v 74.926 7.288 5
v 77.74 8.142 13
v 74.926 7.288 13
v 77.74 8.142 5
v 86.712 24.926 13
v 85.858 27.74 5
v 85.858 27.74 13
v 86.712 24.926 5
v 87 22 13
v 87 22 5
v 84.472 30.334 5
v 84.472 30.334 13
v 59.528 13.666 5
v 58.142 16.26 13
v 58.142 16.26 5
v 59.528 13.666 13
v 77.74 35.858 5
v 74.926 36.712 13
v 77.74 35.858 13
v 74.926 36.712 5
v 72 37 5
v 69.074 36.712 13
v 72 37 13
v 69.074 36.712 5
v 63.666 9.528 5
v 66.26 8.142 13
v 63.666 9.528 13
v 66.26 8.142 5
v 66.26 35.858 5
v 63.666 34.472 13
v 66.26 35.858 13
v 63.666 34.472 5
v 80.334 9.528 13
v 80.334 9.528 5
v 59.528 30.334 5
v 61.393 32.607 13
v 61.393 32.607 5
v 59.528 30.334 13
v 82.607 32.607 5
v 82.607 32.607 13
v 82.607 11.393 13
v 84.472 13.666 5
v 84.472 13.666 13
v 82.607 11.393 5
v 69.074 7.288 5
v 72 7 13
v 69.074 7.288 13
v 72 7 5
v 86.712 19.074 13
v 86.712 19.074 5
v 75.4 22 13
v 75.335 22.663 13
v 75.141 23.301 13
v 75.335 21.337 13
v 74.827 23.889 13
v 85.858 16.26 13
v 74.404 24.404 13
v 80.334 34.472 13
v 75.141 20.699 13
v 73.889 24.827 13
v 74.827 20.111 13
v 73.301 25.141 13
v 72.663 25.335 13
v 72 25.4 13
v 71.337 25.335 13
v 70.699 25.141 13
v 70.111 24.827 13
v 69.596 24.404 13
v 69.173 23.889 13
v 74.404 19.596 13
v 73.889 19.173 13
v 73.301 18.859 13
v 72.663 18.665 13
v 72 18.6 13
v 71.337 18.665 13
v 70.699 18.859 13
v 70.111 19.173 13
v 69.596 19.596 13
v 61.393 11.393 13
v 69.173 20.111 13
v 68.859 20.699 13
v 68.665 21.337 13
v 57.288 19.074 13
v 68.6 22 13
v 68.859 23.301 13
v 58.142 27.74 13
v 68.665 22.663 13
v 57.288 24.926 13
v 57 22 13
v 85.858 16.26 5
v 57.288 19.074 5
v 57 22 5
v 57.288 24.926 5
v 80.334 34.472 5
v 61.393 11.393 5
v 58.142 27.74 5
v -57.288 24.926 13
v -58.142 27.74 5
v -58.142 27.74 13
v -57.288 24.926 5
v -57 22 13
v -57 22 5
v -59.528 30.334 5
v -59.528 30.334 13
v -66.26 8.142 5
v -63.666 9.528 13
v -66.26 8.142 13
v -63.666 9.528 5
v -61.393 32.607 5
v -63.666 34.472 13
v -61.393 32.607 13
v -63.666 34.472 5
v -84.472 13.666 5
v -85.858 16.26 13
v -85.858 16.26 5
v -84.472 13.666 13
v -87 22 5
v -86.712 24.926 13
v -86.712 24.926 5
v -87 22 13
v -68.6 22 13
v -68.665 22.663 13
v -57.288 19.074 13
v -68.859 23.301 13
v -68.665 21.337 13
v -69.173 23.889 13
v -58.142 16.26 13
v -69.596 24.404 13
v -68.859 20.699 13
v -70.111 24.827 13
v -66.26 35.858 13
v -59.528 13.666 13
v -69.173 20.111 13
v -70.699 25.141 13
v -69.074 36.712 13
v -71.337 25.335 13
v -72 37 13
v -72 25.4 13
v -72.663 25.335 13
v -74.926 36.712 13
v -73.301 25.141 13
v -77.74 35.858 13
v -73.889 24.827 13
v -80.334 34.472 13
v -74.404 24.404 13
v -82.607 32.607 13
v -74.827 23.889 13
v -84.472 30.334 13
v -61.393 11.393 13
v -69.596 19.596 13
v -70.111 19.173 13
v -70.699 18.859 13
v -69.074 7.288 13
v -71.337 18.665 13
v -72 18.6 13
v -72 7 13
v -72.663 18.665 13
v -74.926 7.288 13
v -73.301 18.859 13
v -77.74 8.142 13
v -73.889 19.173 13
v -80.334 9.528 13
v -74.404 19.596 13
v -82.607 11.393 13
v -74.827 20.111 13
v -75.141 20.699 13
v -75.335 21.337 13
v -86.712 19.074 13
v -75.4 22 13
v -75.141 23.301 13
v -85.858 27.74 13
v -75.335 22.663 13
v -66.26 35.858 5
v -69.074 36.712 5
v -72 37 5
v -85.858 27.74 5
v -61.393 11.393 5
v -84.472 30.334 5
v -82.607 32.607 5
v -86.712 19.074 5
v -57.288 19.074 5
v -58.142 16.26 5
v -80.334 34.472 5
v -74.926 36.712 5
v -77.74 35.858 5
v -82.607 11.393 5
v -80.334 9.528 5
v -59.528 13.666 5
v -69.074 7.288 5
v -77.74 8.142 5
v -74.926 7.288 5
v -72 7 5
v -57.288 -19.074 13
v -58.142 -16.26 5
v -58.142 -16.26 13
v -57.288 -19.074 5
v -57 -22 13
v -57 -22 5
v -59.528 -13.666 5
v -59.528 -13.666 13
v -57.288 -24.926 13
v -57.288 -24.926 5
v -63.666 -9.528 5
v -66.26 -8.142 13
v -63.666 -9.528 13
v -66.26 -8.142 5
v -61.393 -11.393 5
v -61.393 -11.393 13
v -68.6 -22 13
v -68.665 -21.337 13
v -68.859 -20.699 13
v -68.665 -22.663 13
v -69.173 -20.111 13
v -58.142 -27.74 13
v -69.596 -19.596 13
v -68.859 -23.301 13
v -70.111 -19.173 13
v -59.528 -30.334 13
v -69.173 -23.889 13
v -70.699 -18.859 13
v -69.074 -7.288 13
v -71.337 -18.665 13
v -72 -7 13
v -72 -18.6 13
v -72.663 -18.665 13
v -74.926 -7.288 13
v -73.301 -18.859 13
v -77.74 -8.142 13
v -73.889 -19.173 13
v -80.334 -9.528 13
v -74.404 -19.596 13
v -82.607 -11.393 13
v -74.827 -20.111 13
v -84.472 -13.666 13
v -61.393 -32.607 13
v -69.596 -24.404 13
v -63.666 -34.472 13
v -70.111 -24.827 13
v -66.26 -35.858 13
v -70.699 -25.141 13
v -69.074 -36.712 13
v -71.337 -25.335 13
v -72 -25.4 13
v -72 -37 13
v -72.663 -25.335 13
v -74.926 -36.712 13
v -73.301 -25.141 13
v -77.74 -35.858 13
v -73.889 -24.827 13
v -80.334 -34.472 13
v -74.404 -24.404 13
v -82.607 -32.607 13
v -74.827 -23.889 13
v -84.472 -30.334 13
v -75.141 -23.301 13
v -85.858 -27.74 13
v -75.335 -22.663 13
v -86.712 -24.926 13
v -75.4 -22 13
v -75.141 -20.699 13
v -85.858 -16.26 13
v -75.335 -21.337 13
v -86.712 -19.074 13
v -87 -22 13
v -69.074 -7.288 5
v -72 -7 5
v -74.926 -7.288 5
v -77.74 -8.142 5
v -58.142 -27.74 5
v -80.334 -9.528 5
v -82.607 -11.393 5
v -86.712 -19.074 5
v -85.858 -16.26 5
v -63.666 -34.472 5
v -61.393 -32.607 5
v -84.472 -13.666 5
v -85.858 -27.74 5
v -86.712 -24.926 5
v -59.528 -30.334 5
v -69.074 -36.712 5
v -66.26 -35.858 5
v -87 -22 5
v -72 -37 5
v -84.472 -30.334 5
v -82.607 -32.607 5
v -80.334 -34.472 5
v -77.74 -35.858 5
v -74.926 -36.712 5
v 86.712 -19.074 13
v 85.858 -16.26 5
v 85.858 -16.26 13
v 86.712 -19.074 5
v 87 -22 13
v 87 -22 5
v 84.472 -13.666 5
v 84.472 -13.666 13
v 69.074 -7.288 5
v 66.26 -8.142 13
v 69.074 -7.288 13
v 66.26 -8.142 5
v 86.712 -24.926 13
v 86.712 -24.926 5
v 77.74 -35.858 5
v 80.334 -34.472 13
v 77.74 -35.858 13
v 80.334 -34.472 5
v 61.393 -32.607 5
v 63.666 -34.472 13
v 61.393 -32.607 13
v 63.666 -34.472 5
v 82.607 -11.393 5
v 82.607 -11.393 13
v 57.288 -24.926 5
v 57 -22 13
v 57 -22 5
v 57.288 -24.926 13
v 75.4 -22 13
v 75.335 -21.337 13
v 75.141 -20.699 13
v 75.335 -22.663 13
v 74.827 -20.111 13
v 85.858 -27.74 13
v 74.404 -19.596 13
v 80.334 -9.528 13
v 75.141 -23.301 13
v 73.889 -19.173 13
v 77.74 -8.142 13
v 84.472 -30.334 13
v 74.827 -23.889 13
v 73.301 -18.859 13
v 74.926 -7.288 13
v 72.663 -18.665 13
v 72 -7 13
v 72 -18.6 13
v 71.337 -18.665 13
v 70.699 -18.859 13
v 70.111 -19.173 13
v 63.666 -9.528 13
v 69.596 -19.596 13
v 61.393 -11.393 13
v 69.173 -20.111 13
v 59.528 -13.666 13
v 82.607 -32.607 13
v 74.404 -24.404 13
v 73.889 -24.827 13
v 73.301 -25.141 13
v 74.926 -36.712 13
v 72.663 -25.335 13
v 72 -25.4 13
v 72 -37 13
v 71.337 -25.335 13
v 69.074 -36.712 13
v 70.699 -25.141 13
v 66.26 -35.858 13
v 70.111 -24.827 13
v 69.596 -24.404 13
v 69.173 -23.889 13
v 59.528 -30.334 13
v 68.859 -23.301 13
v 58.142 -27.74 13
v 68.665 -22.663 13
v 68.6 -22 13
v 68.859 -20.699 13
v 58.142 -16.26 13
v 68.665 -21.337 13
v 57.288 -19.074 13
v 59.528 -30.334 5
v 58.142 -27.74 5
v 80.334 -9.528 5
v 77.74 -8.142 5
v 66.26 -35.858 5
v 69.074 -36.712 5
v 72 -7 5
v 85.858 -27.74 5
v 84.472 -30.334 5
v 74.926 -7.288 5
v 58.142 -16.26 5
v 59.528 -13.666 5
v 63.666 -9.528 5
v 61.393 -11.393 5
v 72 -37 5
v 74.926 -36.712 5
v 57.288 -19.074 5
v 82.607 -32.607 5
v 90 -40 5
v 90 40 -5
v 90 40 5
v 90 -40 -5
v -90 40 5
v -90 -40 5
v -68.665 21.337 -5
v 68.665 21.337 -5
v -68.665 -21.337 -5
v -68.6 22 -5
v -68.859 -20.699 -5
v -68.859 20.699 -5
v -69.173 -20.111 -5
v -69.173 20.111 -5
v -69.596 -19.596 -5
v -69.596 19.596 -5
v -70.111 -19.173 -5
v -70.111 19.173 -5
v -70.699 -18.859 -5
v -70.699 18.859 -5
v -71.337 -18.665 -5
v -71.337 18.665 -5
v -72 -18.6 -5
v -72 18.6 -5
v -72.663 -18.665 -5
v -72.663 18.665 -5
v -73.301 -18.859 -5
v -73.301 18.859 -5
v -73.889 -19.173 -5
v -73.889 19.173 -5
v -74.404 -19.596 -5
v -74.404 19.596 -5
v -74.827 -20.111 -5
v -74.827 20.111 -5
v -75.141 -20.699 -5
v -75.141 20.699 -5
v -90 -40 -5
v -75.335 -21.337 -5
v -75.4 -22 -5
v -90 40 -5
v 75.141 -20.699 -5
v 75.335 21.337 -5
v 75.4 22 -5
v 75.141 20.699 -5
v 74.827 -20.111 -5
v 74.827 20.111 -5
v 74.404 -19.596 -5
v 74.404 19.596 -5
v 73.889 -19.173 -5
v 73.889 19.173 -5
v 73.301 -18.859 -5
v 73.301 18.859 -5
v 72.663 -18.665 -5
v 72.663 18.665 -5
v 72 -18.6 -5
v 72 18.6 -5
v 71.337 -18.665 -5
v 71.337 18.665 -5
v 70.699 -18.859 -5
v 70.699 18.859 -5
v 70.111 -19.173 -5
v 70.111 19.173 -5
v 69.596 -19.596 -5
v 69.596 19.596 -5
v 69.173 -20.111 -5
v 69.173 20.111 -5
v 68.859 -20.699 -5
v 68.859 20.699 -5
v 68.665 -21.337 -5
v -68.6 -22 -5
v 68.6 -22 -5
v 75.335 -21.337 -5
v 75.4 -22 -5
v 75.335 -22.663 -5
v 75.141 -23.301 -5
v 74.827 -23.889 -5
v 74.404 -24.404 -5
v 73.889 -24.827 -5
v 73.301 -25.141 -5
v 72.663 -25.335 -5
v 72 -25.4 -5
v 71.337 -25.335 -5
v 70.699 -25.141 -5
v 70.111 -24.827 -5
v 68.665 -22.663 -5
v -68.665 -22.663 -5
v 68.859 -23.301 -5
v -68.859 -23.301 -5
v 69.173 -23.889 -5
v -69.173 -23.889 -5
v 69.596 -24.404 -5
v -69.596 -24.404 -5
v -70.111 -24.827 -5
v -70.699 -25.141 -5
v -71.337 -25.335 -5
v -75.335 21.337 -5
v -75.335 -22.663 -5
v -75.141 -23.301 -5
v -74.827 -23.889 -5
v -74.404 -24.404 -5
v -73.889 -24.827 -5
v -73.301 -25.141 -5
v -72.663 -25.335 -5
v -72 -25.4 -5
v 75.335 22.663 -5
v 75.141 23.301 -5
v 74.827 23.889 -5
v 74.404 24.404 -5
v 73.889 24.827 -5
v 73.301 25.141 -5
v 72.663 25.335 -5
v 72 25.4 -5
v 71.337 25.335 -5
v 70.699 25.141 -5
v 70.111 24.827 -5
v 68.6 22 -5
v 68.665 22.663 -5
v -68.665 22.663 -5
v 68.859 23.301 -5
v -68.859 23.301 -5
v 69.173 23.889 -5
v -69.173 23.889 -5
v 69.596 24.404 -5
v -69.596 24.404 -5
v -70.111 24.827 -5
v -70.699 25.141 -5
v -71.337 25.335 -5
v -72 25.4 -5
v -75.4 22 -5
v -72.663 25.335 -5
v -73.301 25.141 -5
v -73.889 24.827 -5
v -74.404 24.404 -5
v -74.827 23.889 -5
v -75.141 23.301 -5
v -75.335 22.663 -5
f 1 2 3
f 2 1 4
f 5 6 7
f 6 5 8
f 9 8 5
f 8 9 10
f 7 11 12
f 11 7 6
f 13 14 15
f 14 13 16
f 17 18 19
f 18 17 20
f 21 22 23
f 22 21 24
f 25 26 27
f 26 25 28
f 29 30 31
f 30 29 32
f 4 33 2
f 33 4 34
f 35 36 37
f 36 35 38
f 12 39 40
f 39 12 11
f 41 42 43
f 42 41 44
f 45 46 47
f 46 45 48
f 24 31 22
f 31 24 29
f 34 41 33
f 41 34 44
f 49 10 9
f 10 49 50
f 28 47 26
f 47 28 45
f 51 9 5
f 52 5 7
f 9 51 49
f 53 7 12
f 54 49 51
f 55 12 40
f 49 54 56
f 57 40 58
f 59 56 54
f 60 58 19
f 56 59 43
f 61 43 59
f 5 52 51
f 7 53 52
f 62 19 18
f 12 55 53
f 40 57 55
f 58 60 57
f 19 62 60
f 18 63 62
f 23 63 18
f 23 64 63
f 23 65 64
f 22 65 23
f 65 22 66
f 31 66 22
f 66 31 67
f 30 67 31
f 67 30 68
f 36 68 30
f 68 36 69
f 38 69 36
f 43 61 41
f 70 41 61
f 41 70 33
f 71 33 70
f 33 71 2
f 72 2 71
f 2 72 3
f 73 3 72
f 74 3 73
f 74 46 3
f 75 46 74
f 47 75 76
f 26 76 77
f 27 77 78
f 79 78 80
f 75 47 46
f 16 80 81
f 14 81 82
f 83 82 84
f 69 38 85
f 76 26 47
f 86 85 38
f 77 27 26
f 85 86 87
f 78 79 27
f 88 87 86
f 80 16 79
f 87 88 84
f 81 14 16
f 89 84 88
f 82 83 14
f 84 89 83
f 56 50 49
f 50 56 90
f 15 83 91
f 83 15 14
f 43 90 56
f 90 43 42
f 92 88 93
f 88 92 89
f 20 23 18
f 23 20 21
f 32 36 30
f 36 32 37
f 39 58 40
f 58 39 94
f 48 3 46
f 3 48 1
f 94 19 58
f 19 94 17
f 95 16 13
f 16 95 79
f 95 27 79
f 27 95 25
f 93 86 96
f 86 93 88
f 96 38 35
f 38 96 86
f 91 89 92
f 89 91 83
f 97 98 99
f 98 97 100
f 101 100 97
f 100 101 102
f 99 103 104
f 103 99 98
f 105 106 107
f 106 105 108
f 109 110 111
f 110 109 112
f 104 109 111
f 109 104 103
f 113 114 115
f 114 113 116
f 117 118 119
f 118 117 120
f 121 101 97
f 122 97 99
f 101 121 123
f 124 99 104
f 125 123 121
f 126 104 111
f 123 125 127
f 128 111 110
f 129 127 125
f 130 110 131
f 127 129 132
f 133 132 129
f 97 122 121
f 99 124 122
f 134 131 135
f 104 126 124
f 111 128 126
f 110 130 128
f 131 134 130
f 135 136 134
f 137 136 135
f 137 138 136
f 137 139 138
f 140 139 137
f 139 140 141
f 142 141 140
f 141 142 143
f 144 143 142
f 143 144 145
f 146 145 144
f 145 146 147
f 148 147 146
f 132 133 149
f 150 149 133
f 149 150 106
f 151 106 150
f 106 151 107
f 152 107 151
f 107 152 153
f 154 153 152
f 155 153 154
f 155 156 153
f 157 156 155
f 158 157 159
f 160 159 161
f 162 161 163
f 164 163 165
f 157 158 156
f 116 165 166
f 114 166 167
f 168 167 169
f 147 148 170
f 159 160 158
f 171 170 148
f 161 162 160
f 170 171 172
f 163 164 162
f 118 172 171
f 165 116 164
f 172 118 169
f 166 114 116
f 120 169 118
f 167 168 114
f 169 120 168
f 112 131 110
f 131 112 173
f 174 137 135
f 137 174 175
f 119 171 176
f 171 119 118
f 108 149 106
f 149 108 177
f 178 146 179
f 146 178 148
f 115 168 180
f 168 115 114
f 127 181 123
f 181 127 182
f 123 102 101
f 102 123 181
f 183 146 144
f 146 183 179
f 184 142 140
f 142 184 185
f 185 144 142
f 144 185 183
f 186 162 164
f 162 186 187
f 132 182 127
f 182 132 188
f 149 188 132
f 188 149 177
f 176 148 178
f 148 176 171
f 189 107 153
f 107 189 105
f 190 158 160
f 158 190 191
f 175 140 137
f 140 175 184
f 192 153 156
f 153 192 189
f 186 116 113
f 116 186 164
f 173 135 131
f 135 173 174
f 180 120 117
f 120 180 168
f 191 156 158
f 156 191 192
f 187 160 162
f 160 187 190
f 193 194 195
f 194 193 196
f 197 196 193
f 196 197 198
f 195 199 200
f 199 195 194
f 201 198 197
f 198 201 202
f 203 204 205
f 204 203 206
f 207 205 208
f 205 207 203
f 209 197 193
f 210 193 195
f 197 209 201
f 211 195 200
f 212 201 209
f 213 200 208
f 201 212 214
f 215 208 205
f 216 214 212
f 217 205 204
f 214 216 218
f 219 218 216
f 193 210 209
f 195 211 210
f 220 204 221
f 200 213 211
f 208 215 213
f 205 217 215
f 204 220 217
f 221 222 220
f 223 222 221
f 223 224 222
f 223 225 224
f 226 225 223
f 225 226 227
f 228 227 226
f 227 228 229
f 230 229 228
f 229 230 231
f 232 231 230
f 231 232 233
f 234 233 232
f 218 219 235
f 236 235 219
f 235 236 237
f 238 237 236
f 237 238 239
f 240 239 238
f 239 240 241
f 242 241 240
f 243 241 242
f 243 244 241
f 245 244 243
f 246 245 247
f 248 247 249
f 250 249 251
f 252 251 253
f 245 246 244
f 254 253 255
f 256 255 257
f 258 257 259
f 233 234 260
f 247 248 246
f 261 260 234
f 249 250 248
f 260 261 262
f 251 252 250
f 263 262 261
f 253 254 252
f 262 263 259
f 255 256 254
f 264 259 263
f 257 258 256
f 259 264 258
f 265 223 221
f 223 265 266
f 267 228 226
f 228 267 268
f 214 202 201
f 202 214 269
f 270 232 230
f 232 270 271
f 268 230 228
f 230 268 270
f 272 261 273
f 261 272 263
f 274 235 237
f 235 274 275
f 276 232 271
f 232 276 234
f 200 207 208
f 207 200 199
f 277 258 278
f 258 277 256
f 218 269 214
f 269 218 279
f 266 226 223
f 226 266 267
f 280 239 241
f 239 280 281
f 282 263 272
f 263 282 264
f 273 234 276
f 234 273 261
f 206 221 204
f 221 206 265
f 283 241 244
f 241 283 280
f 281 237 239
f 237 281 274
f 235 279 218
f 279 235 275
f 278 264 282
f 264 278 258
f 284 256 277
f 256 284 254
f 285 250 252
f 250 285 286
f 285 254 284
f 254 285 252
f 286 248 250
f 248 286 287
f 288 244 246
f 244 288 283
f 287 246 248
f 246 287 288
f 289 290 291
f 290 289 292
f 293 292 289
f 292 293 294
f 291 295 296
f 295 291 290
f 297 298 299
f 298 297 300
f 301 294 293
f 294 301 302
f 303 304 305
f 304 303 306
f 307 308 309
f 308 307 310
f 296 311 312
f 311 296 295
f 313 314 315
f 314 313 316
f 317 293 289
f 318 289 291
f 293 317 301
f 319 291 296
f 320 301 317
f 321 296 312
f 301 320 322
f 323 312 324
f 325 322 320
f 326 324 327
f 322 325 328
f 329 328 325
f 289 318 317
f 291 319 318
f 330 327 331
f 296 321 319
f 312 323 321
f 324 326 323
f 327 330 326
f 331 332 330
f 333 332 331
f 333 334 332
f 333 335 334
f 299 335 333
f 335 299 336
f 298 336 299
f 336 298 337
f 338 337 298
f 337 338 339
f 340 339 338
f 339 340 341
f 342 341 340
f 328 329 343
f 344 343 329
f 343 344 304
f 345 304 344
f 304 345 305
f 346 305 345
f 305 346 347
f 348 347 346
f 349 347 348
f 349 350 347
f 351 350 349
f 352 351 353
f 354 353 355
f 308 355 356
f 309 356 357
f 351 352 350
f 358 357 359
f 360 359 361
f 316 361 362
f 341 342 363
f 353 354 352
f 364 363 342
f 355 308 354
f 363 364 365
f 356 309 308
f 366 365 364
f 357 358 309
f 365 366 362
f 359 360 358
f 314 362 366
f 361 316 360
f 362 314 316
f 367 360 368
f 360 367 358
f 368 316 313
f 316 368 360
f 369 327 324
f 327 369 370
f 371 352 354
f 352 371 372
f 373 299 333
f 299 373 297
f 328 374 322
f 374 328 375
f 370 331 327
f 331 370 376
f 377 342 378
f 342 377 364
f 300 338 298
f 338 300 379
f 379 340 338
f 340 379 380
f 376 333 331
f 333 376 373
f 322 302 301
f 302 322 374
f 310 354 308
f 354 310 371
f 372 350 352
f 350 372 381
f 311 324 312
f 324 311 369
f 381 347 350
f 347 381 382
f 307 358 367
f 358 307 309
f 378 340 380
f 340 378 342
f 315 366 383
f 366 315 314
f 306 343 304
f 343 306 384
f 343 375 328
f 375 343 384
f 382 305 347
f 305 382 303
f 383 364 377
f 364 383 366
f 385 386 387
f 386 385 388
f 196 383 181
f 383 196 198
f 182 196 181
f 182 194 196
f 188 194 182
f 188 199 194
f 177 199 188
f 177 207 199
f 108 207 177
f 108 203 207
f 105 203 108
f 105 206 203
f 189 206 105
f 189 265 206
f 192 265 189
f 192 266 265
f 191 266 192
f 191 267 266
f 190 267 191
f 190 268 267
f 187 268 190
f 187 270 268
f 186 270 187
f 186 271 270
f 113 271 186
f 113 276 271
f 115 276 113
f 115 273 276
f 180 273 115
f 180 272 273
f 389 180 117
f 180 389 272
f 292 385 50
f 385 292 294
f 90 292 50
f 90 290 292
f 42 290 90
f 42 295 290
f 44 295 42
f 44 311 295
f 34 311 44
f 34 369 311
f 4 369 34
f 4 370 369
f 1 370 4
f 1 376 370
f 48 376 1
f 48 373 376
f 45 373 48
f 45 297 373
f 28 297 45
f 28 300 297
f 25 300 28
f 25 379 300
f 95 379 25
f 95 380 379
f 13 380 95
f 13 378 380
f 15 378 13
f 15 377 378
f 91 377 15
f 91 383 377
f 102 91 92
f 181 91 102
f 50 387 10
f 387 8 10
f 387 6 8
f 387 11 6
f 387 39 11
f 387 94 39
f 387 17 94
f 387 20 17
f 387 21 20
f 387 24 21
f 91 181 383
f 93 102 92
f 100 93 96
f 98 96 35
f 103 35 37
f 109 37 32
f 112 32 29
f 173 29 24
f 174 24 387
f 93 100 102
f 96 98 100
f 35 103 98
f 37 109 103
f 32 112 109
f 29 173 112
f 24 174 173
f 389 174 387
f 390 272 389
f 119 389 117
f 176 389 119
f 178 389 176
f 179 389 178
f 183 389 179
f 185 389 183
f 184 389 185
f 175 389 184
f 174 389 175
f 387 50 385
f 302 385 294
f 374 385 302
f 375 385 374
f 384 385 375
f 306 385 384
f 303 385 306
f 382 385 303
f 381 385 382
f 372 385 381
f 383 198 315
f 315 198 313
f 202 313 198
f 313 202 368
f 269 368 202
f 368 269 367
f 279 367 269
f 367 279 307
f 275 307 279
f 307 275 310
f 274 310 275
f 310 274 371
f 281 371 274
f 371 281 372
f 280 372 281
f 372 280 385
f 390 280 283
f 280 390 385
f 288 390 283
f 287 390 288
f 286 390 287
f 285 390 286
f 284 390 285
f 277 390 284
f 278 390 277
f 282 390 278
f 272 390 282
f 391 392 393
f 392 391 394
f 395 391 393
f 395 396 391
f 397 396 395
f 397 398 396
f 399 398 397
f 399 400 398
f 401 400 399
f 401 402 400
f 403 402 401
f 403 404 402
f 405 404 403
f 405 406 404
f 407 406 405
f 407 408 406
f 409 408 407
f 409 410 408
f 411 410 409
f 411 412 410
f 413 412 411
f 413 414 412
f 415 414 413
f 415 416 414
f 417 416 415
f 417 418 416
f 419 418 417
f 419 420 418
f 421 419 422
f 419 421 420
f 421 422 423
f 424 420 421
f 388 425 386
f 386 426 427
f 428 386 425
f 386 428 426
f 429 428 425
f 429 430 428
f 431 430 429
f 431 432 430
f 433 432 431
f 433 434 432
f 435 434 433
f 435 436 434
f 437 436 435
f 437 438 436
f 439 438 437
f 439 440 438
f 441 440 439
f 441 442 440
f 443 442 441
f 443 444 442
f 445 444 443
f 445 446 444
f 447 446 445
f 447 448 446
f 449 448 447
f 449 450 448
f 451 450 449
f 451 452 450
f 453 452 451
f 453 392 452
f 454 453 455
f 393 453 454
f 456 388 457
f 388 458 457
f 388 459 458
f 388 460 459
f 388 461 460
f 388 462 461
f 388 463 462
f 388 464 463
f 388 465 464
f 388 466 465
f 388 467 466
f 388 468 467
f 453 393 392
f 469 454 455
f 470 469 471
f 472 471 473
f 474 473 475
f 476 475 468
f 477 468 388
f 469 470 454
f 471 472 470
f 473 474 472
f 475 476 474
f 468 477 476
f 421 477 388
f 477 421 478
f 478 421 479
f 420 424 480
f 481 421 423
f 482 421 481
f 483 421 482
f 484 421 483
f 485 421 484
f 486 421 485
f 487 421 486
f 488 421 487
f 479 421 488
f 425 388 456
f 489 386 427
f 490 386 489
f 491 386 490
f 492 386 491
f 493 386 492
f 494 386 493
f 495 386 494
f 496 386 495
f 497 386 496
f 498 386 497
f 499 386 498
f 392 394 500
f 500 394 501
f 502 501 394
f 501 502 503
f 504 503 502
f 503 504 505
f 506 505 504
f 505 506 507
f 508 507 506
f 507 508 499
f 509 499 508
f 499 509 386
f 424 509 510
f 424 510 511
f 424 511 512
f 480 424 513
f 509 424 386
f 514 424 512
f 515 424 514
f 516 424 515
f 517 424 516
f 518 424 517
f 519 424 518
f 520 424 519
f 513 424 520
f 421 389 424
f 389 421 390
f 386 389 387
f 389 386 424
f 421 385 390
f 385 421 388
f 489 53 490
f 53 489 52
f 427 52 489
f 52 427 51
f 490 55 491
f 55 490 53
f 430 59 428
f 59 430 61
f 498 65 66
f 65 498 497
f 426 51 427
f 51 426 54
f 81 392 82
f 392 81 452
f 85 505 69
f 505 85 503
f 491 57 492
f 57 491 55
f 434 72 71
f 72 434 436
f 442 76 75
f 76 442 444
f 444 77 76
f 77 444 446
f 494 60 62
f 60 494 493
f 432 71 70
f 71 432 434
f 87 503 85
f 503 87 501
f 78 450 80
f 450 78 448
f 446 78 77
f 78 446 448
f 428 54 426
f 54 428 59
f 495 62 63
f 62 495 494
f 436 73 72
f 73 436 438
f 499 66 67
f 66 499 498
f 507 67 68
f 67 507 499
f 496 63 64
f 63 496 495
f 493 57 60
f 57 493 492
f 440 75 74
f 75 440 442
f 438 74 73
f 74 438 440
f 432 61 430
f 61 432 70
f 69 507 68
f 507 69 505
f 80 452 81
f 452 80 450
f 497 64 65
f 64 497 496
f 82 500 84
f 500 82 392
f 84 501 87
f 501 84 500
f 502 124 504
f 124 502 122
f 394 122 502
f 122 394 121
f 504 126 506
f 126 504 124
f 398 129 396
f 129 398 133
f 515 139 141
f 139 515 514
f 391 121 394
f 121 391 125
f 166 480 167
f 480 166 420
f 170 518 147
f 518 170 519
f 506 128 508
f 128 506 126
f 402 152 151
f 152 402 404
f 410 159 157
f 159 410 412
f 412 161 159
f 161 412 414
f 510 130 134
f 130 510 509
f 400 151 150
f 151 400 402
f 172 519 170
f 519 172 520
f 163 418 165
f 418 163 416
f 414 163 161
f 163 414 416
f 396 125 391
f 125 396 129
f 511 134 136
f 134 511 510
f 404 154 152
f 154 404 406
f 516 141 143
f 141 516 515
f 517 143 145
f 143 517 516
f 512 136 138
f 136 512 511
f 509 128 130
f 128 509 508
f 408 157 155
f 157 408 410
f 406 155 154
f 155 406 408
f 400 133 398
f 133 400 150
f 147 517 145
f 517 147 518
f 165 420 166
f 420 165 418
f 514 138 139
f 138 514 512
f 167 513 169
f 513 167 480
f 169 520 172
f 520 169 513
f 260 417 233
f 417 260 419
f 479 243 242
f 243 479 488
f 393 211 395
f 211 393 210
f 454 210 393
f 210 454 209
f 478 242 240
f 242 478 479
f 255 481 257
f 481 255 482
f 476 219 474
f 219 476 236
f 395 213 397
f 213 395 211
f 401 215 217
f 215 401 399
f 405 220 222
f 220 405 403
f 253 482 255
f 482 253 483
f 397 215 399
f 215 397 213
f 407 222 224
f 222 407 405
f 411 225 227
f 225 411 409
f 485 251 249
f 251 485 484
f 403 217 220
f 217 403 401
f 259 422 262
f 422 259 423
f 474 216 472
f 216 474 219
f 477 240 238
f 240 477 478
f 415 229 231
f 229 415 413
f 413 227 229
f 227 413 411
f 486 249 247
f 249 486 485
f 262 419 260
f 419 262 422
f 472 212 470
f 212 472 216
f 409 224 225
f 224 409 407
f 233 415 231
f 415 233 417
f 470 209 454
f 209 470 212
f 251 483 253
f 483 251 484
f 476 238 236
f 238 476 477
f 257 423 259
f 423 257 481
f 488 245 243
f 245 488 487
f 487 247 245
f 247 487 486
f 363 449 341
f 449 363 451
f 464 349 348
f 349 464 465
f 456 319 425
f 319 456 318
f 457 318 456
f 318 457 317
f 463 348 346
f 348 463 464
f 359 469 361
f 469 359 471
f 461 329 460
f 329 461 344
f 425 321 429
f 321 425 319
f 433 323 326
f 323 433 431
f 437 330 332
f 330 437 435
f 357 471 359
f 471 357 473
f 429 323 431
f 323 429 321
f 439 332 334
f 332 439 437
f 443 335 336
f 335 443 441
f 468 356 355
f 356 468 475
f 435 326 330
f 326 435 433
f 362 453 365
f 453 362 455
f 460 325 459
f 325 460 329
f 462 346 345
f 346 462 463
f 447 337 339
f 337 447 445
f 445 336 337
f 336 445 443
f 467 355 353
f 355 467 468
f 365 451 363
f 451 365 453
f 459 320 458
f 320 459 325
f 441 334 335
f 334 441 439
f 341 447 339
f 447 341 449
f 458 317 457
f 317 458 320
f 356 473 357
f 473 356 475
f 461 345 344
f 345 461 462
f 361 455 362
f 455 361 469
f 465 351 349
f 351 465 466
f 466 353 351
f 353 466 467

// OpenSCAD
$fn = 32;

// ----------------------------------------------------------------------
// Anchor pads 180 x 80 x 18
// four corner bosses with anchor holes
// ----------------------------------------------------------------------

// --- parameters (mm) ---
plate = [180, 80, 10];  // base plate size (x, y, z)
pads = 4;               // boss count, one per corner
edge = 18;              // boss centre offset from the plate edge
boss_d = 30;            // boss diameter
boss_h = 8;             // boss height above the base plate
bore_d = 6.6;           // nominal hole diameter from the drawing
print_allowance = 0.2;  // clearance added for printing

// --- derived feature positions (mm) ---
hole_d = bore_d + print_allowance;  // = 6.8   hole diameter as printed
height = plate[2] + boss_h;         // = 18   overall height of the part
corner_x = plate[0] / 2 - edge;     // = 72   boss centre X
corner_y = plate[1] / 2 - edge;     // = 22   boss centre Y
feature_centers = [
  [corner_x, corner_y],
  [-corner_x, corner_y],
  [-corner_x, -corner_y],
  [corner_x, -corner_y]
];   // boss centres, anchor holes are drilled there

// base plate, four bosses standing on it, anchor holes all the way through
difference() {
  union() {
    cube(plate, center = true);
    for (centre = feature_centers)
      translate([centre[0], centre[1], plate[2] / 2 - 1])
        cylinder(d = boss_d, h = boss_h + 1);
  }
  for (centre = feature_centers)
    translate([centre[0], centre[1], -height])
      cylinder(d = hole_d, h = 2 * height + 2);  // through boss and plate
}
